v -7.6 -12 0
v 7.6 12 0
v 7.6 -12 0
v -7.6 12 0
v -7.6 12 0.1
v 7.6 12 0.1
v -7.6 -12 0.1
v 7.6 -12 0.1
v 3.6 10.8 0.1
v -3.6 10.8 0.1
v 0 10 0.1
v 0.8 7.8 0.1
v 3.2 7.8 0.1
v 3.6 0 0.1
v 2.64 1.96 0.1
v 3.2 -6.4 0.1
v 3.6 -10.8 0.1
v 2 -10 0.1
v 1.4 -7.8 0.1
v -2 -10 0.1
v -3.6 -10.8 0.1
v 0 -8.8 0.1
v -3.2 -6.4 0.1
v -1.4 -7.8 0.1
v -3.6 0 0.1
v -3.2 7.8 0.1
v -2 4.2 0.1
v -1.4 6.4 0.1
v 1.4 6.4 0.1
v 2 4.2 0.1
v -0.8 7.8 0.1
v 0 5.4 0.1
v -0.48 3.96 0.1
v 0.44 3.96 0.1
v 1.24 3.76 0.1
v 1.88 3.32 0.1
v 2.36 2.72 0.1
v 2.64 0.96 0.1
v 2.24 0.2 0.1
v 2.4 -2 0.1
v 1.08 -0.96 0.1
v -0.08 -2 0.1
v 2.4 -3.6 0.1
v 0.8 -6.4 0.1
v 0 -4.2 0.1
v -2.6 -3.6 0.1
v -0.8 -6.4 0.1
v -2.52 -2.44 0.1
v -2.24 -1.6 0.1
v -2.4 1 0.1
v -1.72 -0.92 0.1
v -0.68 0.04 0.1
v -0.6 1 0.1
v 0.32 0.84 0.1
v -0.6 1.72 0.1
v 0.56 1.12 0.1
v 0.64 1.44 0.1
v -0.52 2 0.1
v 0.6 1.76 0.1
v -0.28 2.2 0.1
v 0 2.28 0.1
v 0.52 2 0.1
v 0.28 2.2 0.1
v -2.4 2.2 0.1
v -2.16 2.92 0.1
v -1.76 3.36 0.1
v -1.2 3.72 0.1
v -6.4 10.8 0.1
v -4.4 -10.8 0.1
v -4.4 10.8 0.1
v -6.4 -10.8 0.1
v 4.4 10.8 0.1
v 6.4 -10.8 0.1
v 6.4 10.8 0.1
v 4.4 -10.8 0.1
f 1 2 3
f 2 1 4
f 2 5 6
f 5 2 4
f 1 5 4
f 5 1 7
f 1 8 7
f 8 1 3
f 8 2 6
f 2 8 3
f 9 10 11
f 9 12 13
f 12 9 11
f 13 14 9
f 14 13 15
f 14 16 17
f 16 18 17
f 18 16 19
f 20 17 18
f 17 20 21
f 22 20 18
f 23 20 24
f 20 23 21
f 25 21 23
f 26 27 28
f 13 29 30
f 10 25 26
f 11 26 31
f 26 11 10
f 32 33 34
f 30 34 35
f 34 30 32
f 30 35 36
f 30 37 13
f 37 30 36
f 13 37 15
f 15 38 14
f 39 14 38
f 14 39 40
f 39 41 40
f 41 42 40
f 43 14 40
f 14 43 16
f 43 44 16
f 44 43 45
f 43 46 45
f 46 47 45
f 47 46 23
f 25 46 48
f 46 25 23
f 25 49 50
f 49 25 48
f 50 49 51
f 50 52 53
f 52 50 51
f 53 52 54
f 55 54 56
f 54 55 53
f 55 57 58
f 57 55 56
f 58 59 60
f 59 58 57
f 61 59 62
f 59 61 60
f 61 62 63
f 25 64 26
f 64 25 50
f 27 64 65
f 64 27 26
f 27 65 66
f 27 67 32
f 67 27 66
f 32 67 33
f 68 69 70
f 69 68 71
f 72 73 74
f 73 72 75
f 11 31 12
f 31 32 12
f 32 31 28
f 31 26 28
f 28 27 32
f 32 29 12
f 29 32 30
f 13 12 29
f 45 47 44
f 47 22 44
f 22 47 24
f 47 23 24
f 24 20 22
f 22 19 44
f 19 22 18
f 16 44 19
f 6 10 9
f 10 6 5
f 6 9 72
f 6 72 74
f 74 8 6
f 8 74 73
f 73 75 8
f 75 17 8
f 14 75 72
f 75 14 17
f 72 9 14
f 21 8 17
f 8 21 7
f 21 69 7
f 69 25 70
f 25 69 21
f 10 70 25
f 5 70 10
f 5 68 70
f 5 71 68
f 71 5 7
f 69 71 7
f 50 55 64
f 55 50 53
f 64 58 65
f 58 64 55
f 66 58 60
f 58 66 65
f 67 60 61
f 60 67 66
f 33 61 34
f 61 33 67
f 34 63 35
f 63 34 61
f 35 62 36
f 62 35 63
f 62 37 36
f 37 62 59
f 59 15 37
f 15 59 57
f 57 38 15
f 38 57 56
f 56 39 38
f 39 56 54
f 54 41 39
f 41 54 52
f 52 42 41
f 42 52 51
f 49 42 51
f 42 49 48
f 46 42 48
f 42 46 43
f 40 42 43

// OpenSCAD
// file: ../p/box5-12.scad
use <../lib.scad>
function ldraw_lib__box5_12() = [
// 0 Box with 5 Faces without Any Edges
// 0 Name: box5-12.dat
// 0 Author: Chris Dee [cwdee]
// 0 !LDRAW_ORG Primitive UPDATE 2009-02
// 0 !LICENSE Licensed under CC BY 4.0 : see CAreadme.txt
// 
// 0 BFC CERTIFY CCW
  [0,"BFC","CERTIFY"],
  [0,"BFC","CCW"],
// 
// 0 !HISTORY 2009-09-03 [PTadmin] Official Update 2009-02
// 
// 
// 4 16 1 1 1 1 1 -1 -1 1 -1 -1 1 1
  [4,16,1,1,1,1,1,-1,-1,1,-1,-1,1,1],
// 4 16 -1 0 1 1 0 1 1 1 1 -1 1 1
  [4,16,-1,0,1,1,0,1,1,1,1,-1,1,1],
// 4 16 -1 0 -1 -1 0 1 -1 1 1 -1 1 -1
  [4,16,-1,0,-1,-1,0,1,-1,1,1,-1,1,-1],
// 4 16 1 0 -1 -1 0 -1 -1 1 -1 1 1 -1
  [4,16,1,0,-1,-1,0,-1,-1,1,-1,1,1,-1],
// 4 16 1 0 1 1 0 -1 1 1 -1 1 1 1
  [4,16,1,0,1,1,0,-1,1,1,-1,1,1,1],
// 0
];
module ldraw_lib__box5_12(step=0, col=false, unit=2/5, alt=false, line=0.2, solid=!$preview)
    makepoly(ldraw_lib__box5_12(), step=step, col=col, unit=unit, alt=alt, line=line, solid=solid);
ldraw_lib__box5_12(line=0.2);
// main file
use <../lib.scad>
use <../p/box5-12.scad>
function ldraw_lib__165395a() = [
// 0 Sticker  3.0 x  1.9 with White "2" and Stars on Blue Background with Red Stripes
// 0 Name: 165395a.dat
// 0 Author: Takeshi Takahashi [RainbowDolphin]
// 0 !LDRAW_ORG Part UPDATE 2024-05
// 0 !LICENSE Licensed under CC BY 4.0 : see CAreadme.txt
// 
// 0 BFC CERTIFY CCW
  [0,"BFC","CERTIFY"],
  [0,"BFC","CCW"],
// 
// 0 !KEYWORDS Bricklink 6551stk01, Brickowl 930700, race car, Rebrickable 165395
// 0 !KEYWORDS Set 6551
// 
// 0 !HISTORY 2024-06-30 [OrionP] Official Update 2024-05
// 
// 1 16 0 -0.25 0 19 0 0 0 0.25 0 0 0 30 box5-12.dat
  [1,16,0,-0.25,0,19,0,0,0,0.25,0,0,0,30, ldraw_lib__box5_12()],
// 0 BFC NOCLIP
  [0,"BFC","NOCLIP"],
// 3 1 9 -0.25 27 -9 -0.25 27 0 -0.25 25
  [3,1,9,-0.25,27,-9,-0.25,27,0,-0.25,25],
// 4 1 9 -0.25 27 0 -0.25 25 2 -0.25 19.5 8 -0.25 19.5
  [4,1,9,-0.25,27,0,-0.25,25,2,-0.25,19.5,8,-0.25,19.5],
// 4 1 9 -0.25 0 9 -0.25 27 8 -0.25 19.5 6.6 -0.25 4.9
  [4,1,9,-0.25,0,9,-0.25,27,8,-0.25,19.5,6.6,-0.25,4.9],
// 3 1 9 -0.25 0 8 -0.25 -16 9 -0.25 -27
  [3,1,9,-0.25,0,8,-0.25,-16,9,-0.25,-27],
// 4 1 9 -0.25 -27 8 -0.25 -16 3.5 -0.25 -19.5 5 -0.25 -25
  [4,1,9,-0.25,-27,8,-0.25,-16,3.5,-0.25,-19.5,5,-0.25,-25],
// 4 1 9 -0.25 -27 5 -0.25 -25 -5 -0.25 -25 -9 -0.25 -27
  [4,1,9,-0.25,-27,5,-0.25,-25,-5,-0.25,-25,-9,-0.25,-27],
// 3 1 0 -0.25 -22 -5 -0.25 -25 5 -0.25 -25
  [3,1,0,-0.25,-22,-5,-0.25,-25,5,-0.25,-25],
// 4 1 -9 -0.25 -27 -5 -0.25 -25 -3.5 -0.25 -19.5 -8 -0.25 -16
  [4,1,-9,-0.25,-27,-5,-0.25,-25,-3.5,-0.25,-19.5,-8,-0.25,-16],
// 3 1 -9 -0.25 0 -9 -0.25 -27 -8 -0.25 -16
  [3,1,-9,-0.25,0,-9,-0.25,-27,-8,-0.25,-16],
// 3 1 -8 -0.25 19.5 -5 -0.25 10.5 -3.5 -0.25 16
  [3,1,-8,-0.25,19.5,-5,-0.25,10.5,-3.5,-0.25,16],
// 3 1 8 -0.25 19.5 3.5 -0.25 16 5 -0.25 10.5
  [3,1,8,-0.25,19.5,3.5,-0.25,16,5,-0.25,10.5],
// 3 1 -9 -0.25 27 -9 -0.25 0 -8 -0.25 19.5
  [3,1,-9,-0.25,27,-9,-0.25,0,-8,-0.25,19.5],
// 4 1 -9 -0.25 27 -8 -0.25 19.5 -2 -0.25 19.5 0 -0.25 25
  [4,1,-9,-0.25,27,-8,-0.25,19.5,-2,-0.25,19.5,0,-0.25,25],
// 3 1 0 -0.25 13.5 -1.2 -0.25 9.9 1.1 -0.25 9.9
  [3,1,0,-0.25,13.5,-1.2,-0.25,9.9,1.1,-0.25,9.9],
// 4 1 0 -0.25 13.5 1.1 -0.25 9.9 3.1 -0.25 9.4 5 -0.25 10.5
  [4,1,0,-0.25,13.5,1.1,-0.25,9.9,3.1,-0.25,9.4,5,-0.25,10.5],
// 3 1 5 -0.25 10.5 3.1 -0.25 9.4 4.7 -0.25 8.3
  [3,1,5,-0.25,10.5,3.1,-0.25,9.4,4.7,-0.25,8.3],
// 4 1 5 -0.25 10.5 4.7 -0.25 8.3 5.9 -0.25 6.8 8 -0.25 19.5
  [4,1,5,-0.25,10.5,4.7,-0.25,8.3,5.9,-0.25,6.8,8,-0.25,19.5],
// 3 1 8 -0.25 19.5 5.9 -0.25 6.8 6.6 -0.25 4.9
  [3,1,8,-0.25,19.5,5.9,-0.25,6.8,6.6,-0.25,4.9],
// 3 1 6.6 -0.25 4.9 6.6 -0.25 2.4 9 -0.25 0
  [3,1,6.6,-0.25,4.9,6.6,-0.25,2.4,9,-0.25,0],
// 4 1 9 -0.25 0 6.6 -0.25 2.4 5.6 -0.25 0.5 6 -0.25 -5
  [4,1,9,-0.25,0,6.6,-0.25,2.4,5.6,-0.25,0.5,6,-0.25,-5],
// 3 1 5.6 -0.25 0.5 2.7 -0.25 -2.4 6 -0.25 -5
  [3,1,5.6,-0.25,0.5,2.7,-0.25,-2.4,6,-0.25,-5],
// 3 1 2.7 -0.25 -2.4 -0.2 -0.25 -5 6 -0.25 -5
  [3,1,2.7,-0.25,-2.4,-0.2,-0.25,-5,6,-0.25,-5],
// 4 1 9 -0.25 0 6 -0.25 -5 6 -0.25 -9 8 -0.25 -16
  [4,1,9,-0.25,0,6,-0.25,-5,6,-0.25,-9,8,-0.25,-16],
// 4 1 2 -0.25 -16 8 -0.25 -16 6 -0.25 -9 0 -0.25 -10.5
  [4,1,2,-0.25,-16,8,-0.25,-16,6,-0.25,-9,0,-0.25,-10.5],
// 3 1 6 -0.25 -9 -6.5 -0.25 -9 0 -0.25 -10.5
  [3,1,6,-0.25,-9,-6.5,-0.25,-9,0,-0.25,-10.5],
// 4 1 -2 -0.25 -16 0 -0.25 -10.5 -6.5 -0.25 -9 -8 -0.25 -16
  [4,1,-2,-0.25,-16,0,-0.25,-10.5,-6.5,-0.25,-9,-8,-0.25,-16],
// 4 1 -9 -0.25 0 -8 -0.25 -16 -6.5 -0.25 -9 -6.3 -0.25 -6.1
  [4,1,-9,-0.25,0,-8,-0.25,-16,-6.5,-0.25,-9,-6.3,-0.25,-6.1],
// 4 1 -9 -0.25 0 -6.3 -0.25 -6.1 -5.6 -0.25 -4 -6 -0.25 2.5
  [4,1,-9,-0.25,0,-6.3,-0.25,-6.1,-5.6,-0.25,-4,-6,-0.25,2.5],
// 3 1 -6 -0.25 2.5 -5.6 -0.25 -4 -4.3 -0.25 -2.3
  [3,1,-6,-0.25,2.5,-5.6,-0.25,-4,-4.3,-0.25,-2.3],
// 4 1 -6 -0.25 2.5 -4.3 -0.25 -2.3 -1.7 -0.25 0.1 -1.5 -0.25 2.5
  [4,1,-6,-0.25,2.5,-4.3,-0.25,-2.3,-1.7,-0.25,0.1,-1.5,-0.25,2.5],
// 3 1 -1.5 -0.25 2.5 -1.7 -0.25 0.1 0.8 -0.25 2.1
  [3,1,-1.5,-0.25,2.5,-1.7,-0.25,0.1,0.8,-0.25,2.1],
// 4 1 -1.5 -0.25 4.3 -1.5 -0.25 2.5 0.8 -0.25 2.1 1.4 -0.25 2.8
  [4,1,-1.5,-0.25,4.3,-1.5,-0.25,2.5,0.8,-0.25,2.1,1.4,-0.25,2.8],
// 4 1 -1.3 -0.25 5 -1.5 -0.25 4.3 1.4 -0.25 2.8 1.6 -0.25 3.6
  [4,1,-1.3,-0.25,5,-1.5,-0.25,4.3,1.4,-0.25,2.8,1.6,-0.25,3.6],
// 4 1 -0.7 -0.25 5.5 -1.3 -0.25 5 1.6 -0.25 3.6 1.5 -0.25 4.4
  [4,1,-0.7,-0.25,5.5,-1.3,-0.25,5,1.6,-0.25,3.6,1.5,-0.25,4.4],
// 4 1 0 -0.25 5.7 -0.7 -0.25 5.5 1.5 -0.25 4.4 1.3 -0.25 5
  [4,1,0,-0.25,5.7,-0.7,-0.25,5.5,1.5,-0.25,4.4,1.3,-0.25,5],
// 3 1 0 -0.25 5.7 1.3 -0.25 5 0.7 -0.25 5.5
  [3,1,0,-0.25,5.7,1.3,-0.25,5,0.7,-0.25,5.5],
// 4 1 -9 -0.25 0 -6 -0.25 2.5 -6 -0.25 5.5 -8 -0.25 19.5
  [4,1,-9,-0.25,0,-6,-0.25,2.5,-6,-0.25,5.5,-8,-0.25,19.5],
// 4 1 -8 -0.25 19.5 -6 -0.25 5.5 -5.4 -0.25 7.3 -5 -0.25 10.5
  [4,1,-8,-0.25,19.5,-6,-0.25,5.5,-5.4,-0.25,7.3,-5,-0.25,10.5],
// 3 1 -5 -0.25 10.5 -5.4 -0.25 7.3 -4.4 -0.25 8.4
  [3,1,-5,-0.25,10.5,-5.4,-0.25,7.3,-4.4,-0.25,8.4],
// 4 1 -5 -0.25 10.5 -4.4 -0.25 8.4 -3 -0.25 9.3 0 -0.25 13.5
  [4,1,-5,-0.25,10.5,-4.4,-0.25,8.4,-3,-0.25,9.3,0,-0.25,13.5],
// 3 1 0 -0.25 13.5 -3 -0.25 9.3 -1.2 -0.25 9.9
  [3,1,0,-0.25,13.5,-3,-0.25,9.3,-1.2,-0.25,9.9],
// 4 4 -11 -0.25 27 -16 -0.25 27 -16 -0.25 -27 -11 -0.25 -27
  [4,4,-11,-0.25,27,-16,-0.25,27,-16,-0.25,-27,-11,-0.25,-27],
// 4 4 16 -0.25 27 11 -0.25 27 11 -0.25 -27 16 -0.25 -27
  [4,4,16,-0.25,27,11,-0.25,27,11,-0.25,-27,16,-0.25,-27],
// 0 BFC CLIP
  [0,"BFC","CLIP"],
// 3 16 0 -0.25 25 -2 -0.25 19.5 2 -0.25 19.5
  [3,16,0,-0.25,25,-2,-0.25,19.5,2,-0.25,19.5],
// 4 16 2 -0.25 19.5 -2 -0.25 19.5 -3.5 -0.25 16 0 -0.25 13.5
  [4,16,2,-0.25,19.5,-2,-0.25,19.5,-3.5,-0.25,16,0,-0.25,13.5],
// 3 16 -2 -0.25 19.5 -8 -0.25 19.5 -3.5 -0.25 16
  [3,16,-2,-0.25,19.5,-8,-0.25,19.5,-3.5,-0.25,16],
// 3 16 -3.5 -0.25 16 -5 -0.25 10.5 0 -0.25 13.5
  [3,16,-3.5,-0.25,16,-5,-0.25,10.5,0,-0.25,13.5],
// 4 16 3.5 -0.25 16 2 -0.25 19.5 0 -0.25 13.5 5 -0.25 10.5
  [4,16,3.5,-0.25,16,2,-0.25,19.5,0,-0.25,13.5,5,-0.25,10.5],
// 3 16 8 -0.25 19.5 2 -0.25 19.5 3.5 -0.25 16
  [3,16,8,-0.25,19.5,2,-0.25,19.5,3.5,-0.25,16],
// 3 16 0 -0.25 -10.5 -2 -0.25 -16 2 -0.25 -16
  [3,16,0,-0.25,-10.5,-2,-0.25,-16,2,-0.25,-16],
// 4 16 2 -0.25 -16 -2 -0.25 -16 -3.5 -0.25 -19.5 0 -0.25 -22
  [4,16,2,-0.25,-16,-2,-0.25,-16,-3.5,-0.25,-19.5,0,-0.25,-22],
// 3 16 -2 -0.25 -16 -8 -0.25 -16 -3.5 -0.25 -19.5
  [3,16,-2,-0.25,-16,-8,-0.25,-16,-3.5,-0.25,-19.5],
// 3 16 -3.5 -0.25 -19.5 -5 -0.25 -25 0 -0.25 -22
  [3,16,-3.5,-0.25,-19.5,-5,-0.25,-25,0,-0.25,-22],
// 4 16 3.5 -0.25 -19.5 2 -0.25 -16 0 -0.25 -22 5 -0.25 -25
  [4,16,3.5,-0.25,-19.5,2,-0.25,-16,0,-0.25,-22,5,-0.25,-25],
// 3 16 8 -0.25 -16 2 -0.25 -16 3.5 -0.25 -19.5
  [3,16,8,-0.25,-16,2,-0.25,-16,3.5,-0.25,-19.5],
// 4 16 19 -0.25 30 -19 -0.25 30 -9 -0.25 27 9 -0.25 27
  [4,16,19,-0.25,30,-19,-0.25,30,-9,-0.25,27,9,-0.25,27],
// 3 16 19 -0.25 30 9 -0.25 27 11 -0.25 27
  [3,16,19,-0.25,30,9,-0.25,27,11,-0.25,27],
// 3 16 19 -0.25 30 11 -0.25 27 16 -0.25 27
  [3,16,19,-0.25,30,11,-0.25,27,16,-0.25,27],
// 4 16 19 -0.25 30 16 -0.25 27 16 -0.25 -27 19 -0.25 -30
  [4,16,19,-0.25,30,16,-0.25,27,16,-0.25,-27,19,-0.25,-30],
// 3 16 16 -0.25 -27 11 -0.25 -27 19 -0.25 -30
  [3,16,16,-0.25,-27,11,-0.25,-27,19,-0.25,-30],
// 3 16 11 -0.25 -27 9 -0.25 -27 19 -0.25 -30
  [3,16,11,-0.25,-27,9,-0.25,-27,19,-0.25,-30],
// 4 16 9 -0.25 0 9 -0.25 -27 11 -0.25 -27 11 -0.25 27
  [4,16,9,-0.25,0,9,-0.25,-27,11,-0.25,-27,11,-0.25,27],
// 3 16 11 -0.25 27 9 -0.25 27 9 -0.25 0
  [3,16,11,-0.25,27,9,-0.25,27,9,-0.25,0],
// 4 16 19 -0.25 -30 9 -0.25 -27 -9 -0.25 -27 -19 -0.25 -30
  [4,16,19,-0.25,-30,9,-0.25,-27,-9,-0.25,-27,-19,-0.25,-30],
// 3 16 -9 -0.25 -27 -11 -0.25 -27 -19 -0.25 -30
  [3,16,-9,-0.25,-27,-11,-0.25,-27,-19,-0.25,-30],
// 4 16 -11 -0.25 -27 -9 -0.25 -27 -9 -0.25 0 -11 -0.25 27
  [4,16,-11,-0.25,-27,-9,-0.25,-27,-9,-0.25,0,-11,-0.25,27],
// 3 16 -9 -0.25 27 -11 -0.25 27 -9 -0.25 0
  [3,16,-9,-0.25,27,-11,-0.25,27,-9,-0.25,0],
// 3 16 -19 -0.25 30 -11 -0.25 27 -9 -0.25 27
  [3,16,-19,-0.25,30,-11,-0.25,27,-9,-0.25,27],
// 3 16 -19 -0.25 30 -16 -0.25 27 -11 -0.25 27
  [3,16,-19,-0.25,30,-16,-0.25,27,-11,-0.25,27],
// 4 16 -16 -0.25 27 -19 -0.25 30 -19 -0.25 -30 -16 -0.25 -27
  [4,16,-16,-0.25,27,-19,-0.25,30,-19,-0.25,-30,-16,-0.25,-27],
// 3 16 -11 -0.25 -27 -16 -0.25 -27 -19 -0.25 -30
  [3,16,-11,-0.25,-27,-16,-0.25,-27,-19,-0.25,-30],
// 4 16 -6 -0.25 2.5 -1.5 -0.25 2.5 -1.5 -0.25 4.3 -6 -0.25 5.5
  [4,16,-6,-0.25,2.5,-1.5,-0.25,2.5,-1.5,-0.25,4.3,-6,-0.25,5.5],
// 4 16 -5.4 -0.25 7.3 -6 -0.25 5.5 -1.5 -0.25 4.3 -1.3 -0.25 5
  [4,16,-5.4,-0.25,7.3,-6,-0.25,5.5,-1.5,-0.25,4.3,-1.3,-0.25,5],
// 4 16 -4.4 -0.25 8.4 -5.4 -0.25 7.3 -1.3 -0.25 5 -0.7 -0.25 5.5
  [4,16,-4.4,-0.25,8.4,-5.4,-0.25,7.3,-1.3,-0.25,5,-0.7,-0.25,5.5],
// 4 16 -3 -0.25 9.3 -4.4 -0.25 8.4 -0.7 -0.25 5.5 0 -0.25 5.7
  [4,16,-3,-0.25,9.3,-4.4,-0.25,8.4,-0.7,-0.25,5.5,0,-0.25,5.7],
// 4 16 -1.2 -0.25 9.9 -3 -0.25 9.3 0 -0.25 5.7 1.1 -0.25 9.9
  [4,16,-1.2,-0.25,9.9,-3,-0.25,9.3,0,-0.25,5.7,1.1,-0.25,9.9],
// 4 16 1.1 -0.25 9.9 0 -0.25 5.7 0.7 -0.25 5.5 3.1 -0.25 9.4
  [4,16,1.1,-0.25,9.9,0,-0.25,5.7,0.7,-0.25,5.5,3.1,-0.25,9.4],
// 4 16 3.1 -0.25 9.4 0.7 -0.25 5.5 1.3 -0.25 5 4.7 -0.25 8.3
  [4,16,3.1,-0.25,9.4,0.7,-0.25,5.5,1.3,-0.25,5,4.7,-0.25,8.3],
// 4 16 4.7 -0.25 8.3 1.3 -0.25 5 1.5 -0.25 4.4 5.9 -0.25 6.8
  [4,16,4.7,-0.25,8.3,1.3,-0.25,5,1.5,-0.25,4.4,5.9,-0.25,6.8],
// 4 16 5.9 -0.25 6.8 1.5 -0.25 4.4 1.6 -0.25 3.6 6.6 -0.25 4.9
  [4,16,5.9,-0.25,6.8,1.5,-0.25,4.4,1.6,-0.25,3.6,6.6,-0.25,4.9],
// 4 16 6.6 -0.25 4.9 1.6 -0.25 3.6 1.4 -0.25 2.8 6.6 -0.25 2.4
  [4,16,6.6,-0.25,4.9,1.6,-0.25,3.6,1.4,-0.25,2.8,6.6,-0.25,2.4],
// 4 16 6.6 -0.25 2.4 1.4 -0.25 2.8 0.8 -0.25 2.1 5.6 -0.25 0.5
  [4,16,6.6,-0.25,2.4,1.4,-0.25,2.8,0.8,-0.25,2.1,5.6,-0.25,0.5],
// 4 16 5.6 -0.25 0.5 0.8 -0.25 2.1 -1.7 -0.25 0.1 2.7 -0.25 -2.4
  [4,16,5.6,-0.25,0.5,0.8,-0.25,2.1,-1.7,-0.25,0.1,2.7,-0.25,-2.4],
// 4 16 2.7 -0.25 -2.4 -1.7 -0.25 0.1 -4.3 -0.25 -2.3 -0.2 -0.25 -5
  [4,16,2.7,-0.25,-2.4,-1.7,-0.25,0.1,-4.3,-0.25,-2.3,-0.2,-0.25,-5],
// 4 16 -0.2 -0.25 -5 -4.3 -0.25 -2.3 -5.6 -0.25 -4 -6.3 -0.25 -6.1
  [4,16,-0.2,-0.25,-5,-4.3,-0.25,-2.3,-5.6,-0.25,-4,-6.3,-0.25,-6.1],
// 4 16 -0.2 -0.25 -5 -6.3 -0.25 -6.1 -6.5 -0.25 -9 6 -0.25 -9
  [4,16,-0.2,-0.25,-5,-6.3,-0.25,-6.1,-6.5,-0.25,-9,6,-0.25,-9],
// 3 16 6 -0.25 -5 -0.2 -0.25 -5 6 -0.25 -9
  [3,16,6,-0.25,-5,-0.2,-0.25,-5,6,-0.25,-9],
];
module ldraw_lib__165395a(step=0, col=false, unit=2/5, alt=false, line=0.2, solid=!$preview)
    makepoly(ldraw_lib__165395a(), step=step, col=col, unit=unit, alt=alt, line=line, solid=solid);
ldraw_lib__165395a(line=0.2);
